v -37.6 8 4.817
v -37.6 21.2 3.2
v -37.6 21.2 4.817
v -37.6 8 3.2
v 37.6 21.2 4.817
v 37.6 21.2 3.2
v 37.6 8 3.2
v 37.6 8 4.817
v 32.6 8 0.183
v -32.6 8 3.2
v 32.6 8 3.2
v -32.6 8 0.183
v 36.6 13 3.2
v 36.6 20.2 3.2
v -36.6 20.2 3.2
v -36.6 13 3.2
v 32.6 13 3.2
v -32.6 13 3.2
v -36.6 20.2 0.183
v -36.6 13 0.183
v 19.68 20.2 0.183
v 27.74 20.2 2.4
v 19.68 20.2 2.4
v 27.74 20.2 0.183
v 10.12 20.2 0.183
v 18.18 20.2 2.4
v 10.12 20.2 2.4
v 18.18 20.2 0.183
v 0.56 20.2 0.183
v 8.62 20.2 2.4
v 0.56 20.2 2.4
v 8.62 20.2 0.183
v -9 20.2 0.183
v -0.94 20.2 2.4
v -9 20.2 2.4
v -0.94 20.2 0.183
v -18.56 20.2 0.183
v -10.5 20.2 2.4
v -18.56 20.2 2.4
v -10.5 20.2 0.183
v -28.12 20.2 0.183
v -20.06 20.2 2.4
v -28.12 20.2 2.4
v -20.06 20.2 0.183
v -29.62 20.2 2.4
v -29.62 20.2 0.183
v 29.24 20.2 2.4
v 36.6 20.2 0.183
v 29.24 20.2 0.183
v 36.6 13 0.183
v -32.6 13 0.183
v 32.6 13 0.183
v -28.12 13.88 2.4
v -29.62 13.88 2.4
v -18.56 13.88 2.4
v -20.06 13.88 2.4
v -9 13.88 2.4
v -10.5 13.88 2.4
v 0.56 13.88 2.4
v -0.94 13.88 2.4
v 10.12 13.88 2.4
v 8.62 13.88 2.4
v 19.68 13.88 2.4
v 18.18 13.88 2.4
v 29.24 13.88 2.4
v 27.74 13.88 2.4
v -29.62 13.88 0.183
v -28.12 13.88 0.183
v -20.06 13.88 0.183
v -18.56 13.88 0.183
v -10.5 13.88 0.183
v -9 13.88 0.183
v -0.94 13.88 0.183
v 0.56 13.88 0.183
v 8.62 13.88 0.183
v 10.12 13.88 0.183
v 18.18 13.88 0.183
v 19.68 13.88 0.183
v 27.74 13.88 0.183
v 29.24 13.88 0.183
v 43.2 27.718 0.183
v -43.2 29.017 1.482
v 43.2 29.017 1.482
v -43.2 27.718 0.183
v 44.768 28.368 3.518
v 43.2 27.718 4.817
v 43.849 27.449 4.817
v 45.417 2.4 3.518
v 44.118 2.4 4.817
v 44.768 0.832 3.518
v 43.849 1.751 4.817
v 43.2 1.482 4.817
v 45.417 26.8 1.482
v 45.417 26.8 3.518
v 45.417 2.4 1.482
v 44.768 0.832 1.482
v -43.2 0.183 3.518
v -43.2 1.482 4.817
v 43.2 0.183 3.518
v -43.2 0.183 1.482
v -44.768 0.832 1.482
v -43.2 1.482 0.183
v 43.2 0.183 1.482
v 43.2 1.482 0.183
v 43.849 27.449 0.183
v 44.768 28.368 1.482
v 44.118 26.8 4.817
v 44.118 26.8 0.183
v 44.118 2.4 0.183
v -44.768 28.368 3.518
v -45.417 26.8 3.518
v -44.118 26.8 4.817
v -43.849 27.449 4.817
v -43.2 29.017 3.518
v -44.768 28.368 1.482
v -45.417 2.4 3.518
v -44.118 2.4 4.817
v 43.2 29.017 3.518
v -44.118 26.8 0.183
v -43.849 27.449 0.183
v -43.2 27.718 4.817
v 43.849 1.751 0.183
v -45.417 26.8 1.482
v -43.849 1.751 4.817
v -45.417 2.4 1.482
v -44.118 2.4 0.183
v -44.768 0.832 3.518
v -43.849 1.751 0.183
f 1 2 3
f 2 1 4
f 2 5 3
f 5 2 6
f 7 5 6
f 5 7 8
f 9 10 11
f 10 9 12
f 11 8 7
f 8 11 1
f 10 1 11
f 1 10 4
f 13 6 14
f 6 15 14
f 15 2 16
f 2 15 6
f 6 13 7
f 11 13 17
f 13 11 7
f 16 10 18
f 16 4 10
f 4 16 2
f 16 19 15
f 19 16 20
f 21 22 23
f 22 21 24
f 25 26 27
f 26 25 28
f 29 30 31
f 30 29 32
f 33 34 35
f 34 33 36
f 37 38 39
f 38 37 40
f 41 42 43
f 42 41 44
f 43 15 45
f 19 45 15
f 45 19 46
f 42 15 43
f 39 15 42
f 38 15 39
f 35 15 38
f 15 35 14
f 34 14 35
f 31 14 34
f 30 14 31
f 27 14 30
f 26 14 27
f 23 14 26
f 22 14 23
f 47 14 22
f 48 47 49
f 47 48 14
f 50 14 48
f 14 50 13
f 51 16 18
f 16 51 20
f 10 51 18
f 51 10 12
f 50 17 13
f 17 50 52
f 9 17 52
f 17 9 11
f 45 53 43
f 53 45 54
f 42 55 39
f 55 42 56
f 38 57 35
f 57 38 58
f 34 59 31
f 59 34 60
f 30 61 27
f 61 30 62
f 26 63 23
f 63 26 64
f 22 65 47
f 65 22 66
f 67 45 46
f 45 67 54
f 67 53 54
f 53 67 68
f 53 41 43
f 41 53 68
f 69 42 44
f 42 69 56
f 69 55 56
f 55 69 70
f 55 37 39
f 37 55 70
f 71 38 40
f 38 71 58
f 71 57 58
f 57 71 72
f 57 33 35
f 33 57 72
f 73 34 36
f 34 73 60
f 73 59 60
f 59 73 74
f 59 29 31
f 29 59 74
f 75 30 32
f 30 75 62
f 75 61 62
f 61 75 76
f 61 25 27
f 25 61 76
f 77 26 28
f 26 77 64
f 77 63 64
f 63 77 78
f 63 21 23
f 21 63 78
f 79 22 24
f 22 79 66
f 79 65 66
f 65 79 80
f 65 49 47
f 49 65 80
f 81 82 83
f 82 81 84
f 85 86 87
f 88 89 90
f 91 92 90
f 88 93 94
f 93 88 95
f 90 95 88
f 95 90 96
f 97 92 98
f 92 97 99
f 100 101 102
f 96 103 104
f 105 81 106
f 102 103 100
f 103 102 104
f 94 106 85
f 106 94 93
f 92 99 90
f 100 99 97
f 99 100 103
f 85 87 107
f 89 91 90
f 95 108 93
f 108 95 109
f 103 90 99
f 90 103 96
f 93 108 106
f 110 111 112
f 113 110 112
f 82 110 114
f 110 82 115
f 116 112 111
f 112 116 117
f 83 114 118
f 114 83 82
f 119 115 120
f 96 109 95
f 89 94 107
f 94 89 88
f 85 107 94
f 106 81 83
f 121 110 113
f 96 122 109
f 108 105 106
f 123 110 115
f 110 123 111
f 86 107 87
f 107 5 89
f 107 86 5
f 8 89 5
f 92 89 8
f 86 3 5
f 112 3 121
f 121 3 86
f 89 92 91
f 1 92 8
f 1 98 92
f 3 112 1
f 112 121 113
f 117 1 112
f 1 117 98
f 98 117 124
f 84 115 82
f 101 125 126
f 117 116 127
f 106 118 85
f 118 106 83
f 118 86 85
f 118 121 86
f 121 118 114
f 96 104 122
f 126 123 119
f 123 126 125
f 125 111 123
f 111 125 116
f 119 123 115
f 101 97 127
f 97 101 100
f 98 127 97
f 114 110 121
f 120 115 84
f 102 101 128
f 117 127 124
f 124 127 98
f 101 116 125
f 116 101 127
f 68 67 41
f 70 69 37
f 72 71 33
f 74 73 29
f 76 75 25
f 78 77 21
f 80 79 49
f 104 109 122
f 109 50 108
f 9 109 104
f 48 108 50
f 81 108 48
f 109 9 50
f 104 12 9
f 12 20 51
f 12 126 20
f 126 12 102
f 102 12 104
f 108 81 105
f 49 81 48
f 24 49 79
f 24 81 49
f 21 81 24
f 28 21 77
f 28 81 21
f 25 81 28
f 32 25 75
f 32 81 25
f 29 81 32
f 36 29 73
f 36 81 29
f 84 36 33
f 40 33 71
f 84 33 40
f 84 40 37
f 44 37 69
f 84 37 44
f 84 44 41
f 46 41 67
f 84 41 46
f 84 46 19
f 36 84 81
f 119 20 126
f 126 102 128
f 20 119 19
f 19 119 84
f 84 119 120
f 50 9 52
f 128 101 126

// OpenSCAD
// Vector-9000 - fast line follower robot (version 1.0)
// by Carlosgs (http://carlosgs.es) and Víctor Uceda
// CC-BY-SA license (http://creativecommons.org/licenses/by-sa/3.0/)
// Check http://www.thingiverse.com/thing:65012 for more information

// Original line sensor designed by bitswype (see http://www.thingiverse.com/thing:30516)


$fn = 50;

inches_to_mm = 25.4;

shell_thickness = 8;
sensor_width = 75.2;
sensor_depth = 13.2;
support_thickness = 1;
peg_square = 5;


finger_thickness = 1.5;
finger_offset = 8.73;
finger_center = 9.56;
finger_length = 6.32;

shell_height = 5;
support_height = 3.2;

finger_height = support_height-0.8;

// ----- sensor arm parameters
spacer_thickness = 10.7;
arm_thickness = 5;
connector_height = 24;  //34
connector_thickness = 4;
bolt_spacing = 4;
sensor_connector_depth = 10;
peg_diameter = 3.5;
arm_height = 7;  //17
arm_spacing = 12;
arm_hole_clearance = 0.5;
arm_width = 4;
arm_length = 50;
robot_extra_size = 6;
robot_thickness = 4;
screw_head_clearance = 4;
screw_center = 0.5*inches_to_mm;
screw_hole_diameter = 0.185*inches_to_mm;
arm_clearance = 4;


sensor_holder_length = 2*shell_thickness+sensor_width;
sensor_holder_width = 2*shell_thickness+sensor_depth;

support_h = shell_height;
support_w = 25*2;
support_l = 40;

restpoint_hole_depth = 2.5;

// for printing
translate([-sensor_holder_length/2,0,0])
  intersection() { // Create rounded border
    sensor_holder();
    roundedRect([sensor_holder_length,sensor_holder_width,shell_height],2.4);
  }

//sensor_arm();

//robot_arm_connector();

//arm_spacer();


// --------------------- construct the holder ---------------------------------

//sensor_holder();
//sensor_connector();
//
//color("orange") translate([shell_thickness+sensor_width/2-spacer_thickness/2,-sensor_connector_depth/2,arm_height]) rotate([90,0,-90]) sensor_arm();
//color("orange") translate([shell_thickness+sensor_width/2-spacer_thickness/2,-sensor_connector_depth/2,arm_height+arm_spacing]) rotate([90,0,-90]) sensor_arm();
//
//color("orange") translate([shell_thickness+sensor_width/2+spacer_thickness/2,-sensor_connector_depth/2,arm_height]) rotate([-90,0,-90]) sensor_arm();
//color("orange") translate([shell_thickness+sensor_width/2+spacer_thickness/2,-sensor_connector_depth/2,arm_height+arm_spacing]) rotate([-90,0,-90]) sensor_arm();
//
//color("green") translate([shell_thickness+sensor_width/2-spacer_thickness/2,-sensor_connector_depth/2-arm_length,arm_height]) rotate([0,90,0]) arm_spacer();
//color("green") translate([shell_thickness+sensor_width/2-spacer_thickness/2,-sensor_connector_depth/2-arm_length,arm_height+arm_spacing]) rotate([0,90,0]) arm_spacer();
//
//
//
//color("blue") translate([shell_thickness+sensor_width/2, -sensor_connector_depth/2-arm_length, arm_height]) rotate([-90,0,-90]) translate([-robot_extra_size-screw_center/2, -(robot_thickness+arm_width+arm_clearance+peg_diameter/2+arm_spacing), -(2*robot_thickness+2*screw_head_clearance+screw_center)/2]) union()
//{
//  robot_arm_connector();
//
//  translate([2*robot_extra_size+screw_center,0, 2*robot_thickness+2*screw_head_clearance+screw_center])rotate([0,180,0]) robot_arm_connector();
//}

// --------------------modules-------------------------------

module sensor_connector()
{
  difference()
  {
    // main connector body
    translate([shell_thickness+sensor_width/2-spacer_thickness/2,-sensor_connector_depth, 0]) cube([spacer_thickness,sensor_connector_depth,connector_height]);
    // left side pegs
    translate([shell_thickness+sensor_width/2-spacer_thickness/2-1,-sensor_connector_depth/2,arm_height]) rotate([0,90,0]) cylinder(r=peg_diameter/2, h=spacer_thickness+2);
    translate([shell_thickness+sensor_width/2-spacer_thickness/2-1,-sensor_connector_depth/2,arm_height+arm_spacing]) rotate([0,90,0]) cylinder(r=peg_diameter/2, h=spacer_thickness+2);
  }
}

module arm_spacer()
{
  linear_extrude(height=spacer_thickness) difference()
  {
    circle(r= peg_diameter/2+arm_hole_clearance/2+arm_width/2);
    circle(r= peg_diameter/2+arm_hole_clearance/2);
  }
}

module robot_arm_connector()
{
  difference()
  {
    union()
    {
      cube([2*robot_extra_size+screw_center, robot_thickness, robot_thickness+2*screw_head_clearance]);
      cube([2*robot_extra_size+screw_center, robot_thickness+arm_width+arm_clearance+peg_diameter+arm_spacing+peg_diameter, robot_thickness]);
    }
    
    translate([robot_extra_size, robot_thickness/2, robot_thickness+screw_head_clearance]) rotate([90,0,0]) cylinder(r=screw_hole_diameter/2, h=robot_thickness+2, center=true);
    translate([robot_extra_size+screw_center, robot_thickness/2, robot_thickness+screw_head_clearance]) rotate([90,0,0]) cylinder(r=screw_hole_diameter/2, h=robot_thickness+2, center=true);
    
      // pegs
    translate([robot_extra_size+screw_center/2, robot_thickness+arm_width+arm_clearance+peg_diameter/2, -1]) cylinder(r=peg_diameter/2, h=robot_thickness+2);
    translate([robot_extra_size+screw_center/2, robot_thickness+arm_width+arm_clearance+peg_diameter/2+arm_spacing, -1]) cylinder(r=peg_diameter/2, h=robot_thickness+2);
  }
  
  
}

module sensor_arm()
{
  linear_extrude(height = arm_thickness) difference()
  {
    union()
    {
      translate([0,-arm_width/2]) square([arm_length, arm_width]);
      circle(r= peg_diameter/2+arm_hole_clearance/2+arm_width/2);
      translate([arm_length,0,0]) circle(r= peg_diameter/2+arm_hole_clearance/2+arm_width/2);    
    }
    
    circle(r= peg_diameter/2+arm_hole_clearance/2);
    translate([arm_length,0,0]) circle(r= peg_diameter/2+arm_hole_clearance/2);
  }
}

module sensor_holder()
{
  union()
  {
    // A
    linear_extrude(height=shell_height)
    difference()
    {
      //roundedRect([2*shell_thickness+sensor_width,2*shell_thickness+sensor_depth,shell_height],2);
      square([2*shell_thickness+sensor_width,2*shell_thickness+sensor_depth]);
      translate([shell_thickness, shell_thickness]) square([sensor_width, sensor_depth]);
      //translate([shell_thickness, shell_thickness, -1]) cube([sensor_width, sensor_depth, shell_height*2]);
    }

    // B
    linear_extrude(height=support_height) union()
    {
      translate([shell_thickness, shell_thickness]) square([support_thickness, sensor_depth]);
      translate([shell_thickness+sensor_width-support_thickness, shell_thickness]) square([support_thickness, sensor_depth]);
      translate([shell_thickness,shell_thickness+sensor_depth-support_thickness]) square([sensor_width, support_thickness]);
    }

    // C
    linear_extrude(height=support_height) union()
    {
      translate([shell_thickness,shell_thickness]) square([peg_square, peg_square]);
      translate([shell_thickness+sensor_width-peg_square,shell_thickness]) square([peg_square, peg_square]);
    }

    // D
    //translatecircle(r=peg_diameter/2);

    // fingers
    linear_extrude(height = finger_height) for(i = [0:6])
    {
      translate([shell_thickness-finger_thickness/2+finger_offset+i*finger_center,shell_thickness+sensor_depth-finger_length-support_thickness]) square([finger_thickness, finger_length]);
    }
  }
}




// http://www.thingiverse.com/thing:9347
module roundedRect(size, radius)
{
$fn=8;
x = size[0]-radius*2;
y = size[1]-radius*2;
z = size[2]-radius*2;

translate([radius,radius,radius])
minkowski()
{
cube(size=[x,y,z]);
sphere(r=radius);
}
}

// http://www.thingiverse.com/thing:9347
module roundedRect2D(size, radius)
{
$fn=8;
x = size[0]-radius*2;
y = size[1]-radius*2;
z = size[2];

minkowski()
{
cube(size=[x,y,z],center=true);
cylinder(r=radius,h=0.00001);
}
}
